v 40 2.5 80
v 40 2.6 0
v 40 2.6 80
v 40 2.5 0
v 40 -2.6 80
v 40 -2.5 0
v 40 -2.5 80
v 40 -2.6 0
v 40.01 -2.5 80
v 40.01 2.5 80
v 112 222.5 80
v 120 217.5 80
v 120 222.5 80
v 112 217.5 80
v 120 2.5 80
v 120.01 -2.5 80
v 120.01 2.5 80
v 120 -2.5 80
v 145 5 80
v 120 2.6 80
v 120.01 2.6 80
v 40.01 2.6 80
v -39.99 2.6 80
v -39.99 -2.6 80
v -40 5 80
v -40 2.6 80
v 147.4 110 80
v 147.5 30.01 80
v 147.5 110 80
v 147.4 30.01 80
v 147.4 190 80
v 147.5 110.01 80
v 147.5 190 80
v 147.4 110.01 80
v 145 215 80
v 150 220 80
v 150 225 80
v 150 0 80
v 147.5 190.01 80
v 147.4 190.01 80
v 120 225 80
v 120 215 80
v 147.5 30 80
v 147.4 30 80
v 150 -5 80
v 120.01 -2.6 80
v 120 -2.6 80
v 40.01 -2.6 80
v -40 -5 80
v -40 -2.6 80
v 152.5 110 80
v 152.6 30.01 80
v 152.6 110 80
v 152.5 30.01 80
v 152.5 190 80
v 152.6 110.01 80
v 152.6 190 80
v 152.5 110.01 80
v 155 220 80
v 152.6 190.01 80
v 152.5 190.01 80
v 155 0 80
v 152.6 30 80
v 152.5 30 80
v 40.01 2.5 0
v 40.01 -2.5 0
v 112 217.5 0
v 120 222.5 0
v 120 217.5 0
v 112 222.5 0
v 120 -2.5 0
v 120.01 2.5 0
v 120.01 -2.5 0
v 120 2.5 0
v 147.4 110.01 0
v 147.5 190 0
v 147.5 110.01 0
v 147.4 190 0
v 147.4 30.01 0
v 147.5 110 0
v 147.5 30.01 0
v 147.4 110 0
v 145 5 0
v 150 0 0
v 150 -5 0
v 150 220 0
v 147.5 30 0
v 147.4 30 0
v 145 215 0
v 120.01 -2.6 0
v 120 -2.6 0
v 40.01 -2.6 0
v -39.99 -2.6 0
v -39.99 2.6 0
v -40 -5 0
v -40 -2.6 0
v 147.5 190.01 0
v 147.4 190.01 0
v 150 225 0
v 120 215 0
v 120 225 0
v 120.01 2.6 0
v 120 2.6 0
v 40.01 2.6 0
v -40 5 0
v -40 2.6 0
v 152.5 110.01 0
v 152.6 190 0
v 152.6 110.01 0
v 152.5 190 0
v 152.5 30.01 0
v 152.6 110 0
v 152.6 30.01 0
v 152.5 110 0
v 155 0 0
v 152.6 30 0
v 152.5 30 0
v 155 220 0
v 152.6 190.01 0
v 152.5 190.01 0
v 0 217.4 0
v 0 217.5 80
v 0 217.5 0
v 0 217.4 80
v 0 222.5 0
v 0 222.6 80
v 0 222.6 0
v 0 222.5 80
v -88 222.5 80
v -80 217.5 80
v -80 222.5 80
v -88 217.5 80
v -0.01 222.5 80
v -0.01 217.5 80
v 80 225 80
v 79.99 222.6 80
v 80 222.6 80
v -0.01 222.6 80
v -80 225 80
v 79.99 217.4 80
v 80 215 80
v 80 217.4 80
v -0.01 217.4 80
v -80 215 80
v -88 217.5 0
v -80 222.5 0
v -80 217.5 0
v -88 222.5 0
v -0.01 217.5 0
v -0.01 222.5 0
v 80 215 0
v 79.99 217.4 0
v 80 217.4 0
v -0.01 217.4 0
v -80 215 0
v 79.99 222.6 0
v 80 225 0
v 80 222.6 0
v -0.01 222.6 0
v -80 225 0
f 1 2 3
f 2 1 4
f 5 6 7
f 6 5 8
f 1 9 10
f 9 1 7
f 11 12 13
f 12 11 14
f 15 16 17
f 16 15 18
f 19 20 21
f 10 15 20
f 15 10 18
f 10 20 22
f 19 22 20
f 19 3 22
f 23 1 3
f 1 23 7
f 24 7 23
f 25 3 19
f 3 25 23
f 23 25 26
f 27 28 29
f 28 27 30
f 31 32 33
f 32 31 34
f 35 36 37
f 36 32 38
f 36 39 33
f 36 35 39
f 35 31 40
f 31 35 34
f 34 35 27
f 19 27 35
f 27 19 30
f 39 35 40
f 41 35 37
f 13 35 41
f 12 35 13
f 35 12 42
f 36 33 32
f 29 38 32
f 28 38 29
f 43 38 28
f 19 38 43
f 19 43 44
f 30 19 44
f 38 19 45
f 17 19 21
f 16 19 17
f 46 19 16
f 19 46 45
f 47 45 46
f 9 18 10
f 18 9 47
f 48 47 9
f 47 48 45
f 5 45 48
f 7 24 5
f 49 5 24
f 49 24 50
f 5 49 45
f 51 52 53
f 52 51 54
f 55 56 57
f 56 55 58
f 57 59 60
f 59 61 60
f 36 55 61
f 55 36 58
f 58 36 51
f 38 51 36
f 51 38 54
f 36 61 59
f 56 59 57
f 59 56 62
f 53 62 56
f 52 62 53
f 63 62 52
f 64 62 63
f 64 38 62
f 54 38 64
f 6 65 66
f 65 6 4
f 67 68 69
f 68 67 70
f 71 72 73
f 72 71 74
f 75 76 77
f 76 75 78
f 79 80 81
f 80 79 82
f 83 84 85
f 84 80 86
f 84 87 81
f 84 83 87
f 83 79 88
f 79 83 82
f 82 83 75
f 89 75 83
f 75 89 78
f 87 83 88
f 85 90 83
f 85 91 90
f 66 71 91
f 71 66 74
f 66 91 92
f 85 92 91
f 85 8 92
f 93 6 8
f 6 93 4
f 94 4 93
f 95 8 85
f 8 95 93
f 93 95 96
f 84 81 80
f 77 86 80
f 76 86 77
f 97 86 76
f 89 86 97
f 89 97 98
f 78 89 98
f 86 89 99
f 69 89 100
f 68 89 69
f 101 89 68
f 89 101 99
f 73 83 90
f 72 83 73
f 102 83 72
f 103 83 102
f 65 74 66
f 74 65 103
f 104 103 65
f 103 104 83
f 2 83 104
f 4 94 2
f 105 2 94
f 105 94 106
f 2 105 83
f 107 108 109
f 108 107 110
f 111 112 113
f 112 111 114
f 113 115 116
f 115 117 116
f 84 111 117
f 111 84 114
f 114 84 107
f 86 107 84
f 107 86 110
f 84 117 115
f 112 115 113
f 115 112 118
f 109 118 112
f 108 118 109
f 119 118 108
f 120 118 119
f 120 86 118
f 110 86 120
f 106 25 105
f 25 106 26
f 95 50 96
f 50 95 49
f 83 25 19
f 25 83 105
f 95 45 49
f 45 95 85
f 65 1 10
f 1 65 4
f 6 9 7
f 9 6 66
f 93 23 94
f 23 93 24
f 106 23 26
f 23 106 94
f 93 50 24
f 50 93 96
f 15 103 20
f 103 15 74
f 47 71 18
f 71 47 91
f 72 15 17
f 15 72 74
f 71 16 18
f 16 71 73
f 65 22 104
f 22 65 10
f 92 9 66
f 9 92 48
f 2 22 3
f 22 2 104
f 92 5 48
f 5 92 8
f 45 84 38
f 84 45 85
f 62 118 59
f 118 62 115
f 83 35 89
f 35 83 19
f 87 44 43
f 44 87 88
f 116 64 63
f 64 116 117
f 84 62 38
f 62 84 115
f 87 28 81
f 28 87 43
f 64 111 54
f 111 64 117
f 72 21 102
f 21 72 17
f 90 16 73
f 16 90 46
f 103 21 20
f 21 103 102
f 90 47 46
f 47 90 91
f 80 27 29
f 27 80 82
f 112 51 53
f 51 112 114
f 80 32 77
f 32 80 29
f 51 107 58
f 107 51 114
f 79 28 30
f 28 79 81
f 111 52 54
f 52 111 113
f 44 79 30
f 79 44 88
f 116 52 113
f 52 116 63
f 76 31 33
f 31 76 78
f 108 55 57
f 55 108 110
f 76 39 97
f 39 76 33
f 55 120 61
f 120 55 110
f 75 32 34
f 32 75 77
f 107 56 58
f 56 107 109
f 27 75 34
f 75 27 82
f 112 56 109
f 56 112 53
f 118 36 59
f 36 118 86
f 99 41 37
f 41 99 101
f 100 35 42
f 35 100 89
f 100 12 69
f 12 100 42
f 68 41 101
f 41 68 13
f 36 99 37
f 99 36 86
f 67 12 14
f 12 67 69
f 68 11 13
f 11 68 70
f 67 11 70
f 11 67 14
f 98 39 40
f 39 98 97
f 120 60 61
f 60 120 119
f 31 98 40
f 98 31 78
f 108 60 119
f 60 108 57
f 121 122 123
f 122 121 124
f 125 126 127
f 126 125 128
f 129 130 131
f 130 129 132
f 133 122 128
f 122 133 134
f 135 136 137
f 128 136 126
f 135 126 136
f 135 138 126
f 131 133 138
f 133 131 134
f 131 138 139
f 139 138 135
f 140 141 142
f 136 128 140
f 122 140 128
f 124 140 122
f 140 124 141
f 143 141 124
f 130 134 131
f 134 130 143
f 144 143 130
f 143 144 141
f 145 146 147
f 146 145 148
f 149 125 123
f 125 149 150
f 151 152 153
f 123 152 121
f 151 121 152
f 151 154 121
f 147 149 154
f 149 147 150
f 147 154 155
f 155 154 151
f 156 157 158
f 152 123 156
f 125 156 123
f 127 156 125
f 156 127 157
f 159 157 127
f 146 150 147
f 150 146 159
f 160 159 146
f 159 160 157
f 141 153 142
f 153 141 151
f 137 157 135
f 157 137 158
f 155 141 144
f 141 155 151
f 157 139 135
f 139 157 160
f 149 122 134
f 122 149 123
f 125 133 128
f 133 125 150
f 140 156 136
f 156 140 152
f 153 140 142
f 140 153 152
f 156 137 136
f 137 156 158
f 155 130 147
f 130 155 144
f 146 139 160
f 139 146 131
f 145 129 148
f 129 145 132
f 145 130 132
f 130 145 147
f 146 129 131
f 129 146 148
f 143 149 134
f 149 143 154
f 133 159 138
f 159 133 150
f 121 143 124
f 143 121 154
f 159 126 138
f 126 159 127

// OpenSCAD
// file: corner.scad
// Corner — 90° turn piece. Socket on the -X arm, tab on the +Y arm.
// Drops between two walls (or between any tab/socket pair) to turn the
// chain. Rotate the corner around Z by 0, 90, 180, or 270 degrees to
// aim the turn in any direction.
//
// Open in OpenSCAD, F5 to preview, F6 to render, File > Export > STL.

include <common.scad>;

module corner() {
  difference() {
    union() {
      // -X arm — runs from origin to (-arm_length, 0)
      translate([-arm_length, -wall_thickness / 2, 0])
        cube([arm_length, wall_thickness, wall_height]);
      // +Y arm — runs from origin to (0, +arm_length)
      translate([-wall_thickness / 2, 0, 0])
        cube([wall_thickness, arm_length, wall_height]);
      // Tab at the +Y arm end (sticks out in +Y; rotated joint_tab)
      translate([0, arm_length, 0])
        rotate([0, 0, 90])
          joint_tab();
    }
    // Socket at the -X arm end
    translate([-arm_length, 0, 0])
      joint_socket();
  }
}

corner();
// file: wall.scad
// Wall — a flat panel with a tab on one end and a socket on the other.
// Two walls chain end-to-end (tab of A plugs into socket of B). Multiple
// walls form a straight run; insert a corner piece to turn 90°.
//
// Open this file in OpenSCAD, hit F5 to preview, F6 to render solid,
// then File > Export > Export as STL to print.

include <common.scad>;

module wall() {
  difference() {
    union() {
      // Body — centered along X
      translate([-cell_size / 2, -wall_thickness / 2, 0])
        cube([cell_size, wall_thickness, wall_height]);
      // Tab on the +X end
      translate([cell_size / 2, 0, 0])
        joint_tab();
    }
    // Socket on the -X end
    translate([-cell_size / 2, 0, 0])
      joint_socket();
  }
}

// Render the piece when this file is opened directly.
wall();
// file: common.scad
// Shared dimensions + joint primitives for the SaySpark maze kit.
// Edit values here once and every piece updates uniformly.
//
// Convention used by all pieces in this folder:
//   • Tab on the +X end (sticks out, plugs into the next piece's socket)
//   • Socket on the -X end (pocket cut in, accepts the previous piece's tab)
// Pieces chain end-to-end. Rotate corners 0/90/180/270° to aim turns.

/* [Wall geometry — mm] */
cell_size      = 80;   // [40:5:200]    wall body length (along chain axis)
wall_height    = 80;   // [20:1:120]    how tall the wall stands
wall_thickness = 10;   // [5:0.5:20]    how thick / "wide" the wall is

/* [Joint geometry — mm] */
tab_length     = 8;    // [4:1:15]      how far the tab sticks out / socket goes in
tab_thickness  = 5;    // [2:0.5:9]     tab cross-section (must be < wall_thickness)
slot_clearance = 0.2;  // [0.1:0.05:0.4]  printer tolerance gap

/* [Corner geometry — mm] */
arm_length     = 30;   // [15:1:60]     length of each corner arm

$fn = 48;

// ─── Joint primitives ────────────────────────────────────────────────────
// Tab — sticks out in +X from origin. Origin = base of tab where it joins
// the body. Full wall_height tall so the joint is as strong as the wall.
module joint_tab() {
  translate([0, -tab_thickness / 2, 0])
    cube([tab_length, tab_thickness, wall_height]);
}

// Socket — pocket carved from origin going in -X (into the body).
// Caller subtracts this from a body shape to cut the pocket.
// Sized slightly larger than the tab by `slot_clearance` so parts slide.
module joint_socket() {
  translate([-tab_length - 0.01,
             -(tab_thickness + slot_clearance) / 2,
             -0.01])
    cube([tab_length + 0.02,
          tab_thickness + slot_clearance,
          wall_height + 0.02]);
}
// main file
// Sample maze — example layout chaining walls and corners freely.
// Demonstrates a small zigzag path: east → east → turn north → north →
// north → turn west → west. Use this as a reference for placing your
// own pieces; the math at the bottom of each piece block shows how the
// next position is derived from the previous one's tab tip.
//
// Open in OpenSCAD, F5 to preview the assembled maze. This file does
// NOT export — to print individual pieces, open wall.scad or
// corner.scad directly and export those.

include <common.scad>;
use <wall.scad>;
use <corner.scad>;

// Distance derivations:
//   wall ↔ wall:   adjacent wall centres are exactly cell_size apart
//                  (wall A's tab sits inside wall B's socket; combined
//                  body span = 2 * cell_size, but socket overlap = 0
//                  because the socket pocket is INSIDE wall B).
//   wall → corner: corner centre sits cell_size/2 + arm_length past
//                  the wall centre.
//   corner → wall: next wall centre sits arm_length + cell_size/2
//                  past the corner centre, in the direction of the
//                  corner's tab arm.

// ─── East-bound chain ─────────────────────────────────────────────────────

// Wall 1 — at origin, going east
wall();

// Wall 2 — chained east of wall 1
translate([cell_size, 0, 0])
  wall();

// Corner 1 — turns the chain from east-bound to north-bound
//   Position: cell_size to the east of wall 2, plus the corner's own arm.
//   Rotation: 0° (default) — socket faces -X (west), tab points +Y (north).
translate([cell_size + cell_size / 2 + arm_length, 0, 0])
  corner();

// ─── North-bound chain ────────────────────────────────────────────────────

// Wall 3 — first wall going north (rotated 90°)
//   Position: same X as corner 1, offset north by arm_length + cell_size/2.
translate([cell_size + cell_size / 2 + arm_length,
           arm_length + cell_size / 2, 0])
  rotate([0, 0, 90])
    wall();

// Wall 4 — second wall going north
translate([cell_size + cell_size / 2 + arm_length,
           arm_length + cell_size / 2 + cell_size, 0])
  rotate([0, 0, 90])
    wall();

// Corner 2 — turns the chain from north-bound to west-bound
//   Rotation: 90° — socket faces -Y (south, accepts the north chain),
//             tab points -X (west).
translate([cell_size + cell_size / 2 + arm_length,
           arm_length + cell_size / 2 + cell_size + cell_size / 2 + arm_length,
           0])
  rotate([0, 0, 90])
    corner();

// ─── West-bound chain ─────────────────────────────────────────────────────

// Wall 5 — going west (rotated 180°)
translate([cell_size + cell_size / 2 + arm_length - (cell_size / 2 + arm_length) - cell_size / 2,
           arm_length + cell_size / 2 + cell_size + cell_size / 2 + arm_length,
           0])
  rotate([0, 0, 180])
    wall();

// Wall 6 — final wall going west
translate([cell_size + cell_size / 2 + arm_length - (cell_size / 2 + arm_length) - cell_size / 2 - cell_size,
           arm_length + cell_size / 2 + cell_size + cell_size / 2 + arm_length,
           0])
  rotate([0, 0, 180])
    wall();
